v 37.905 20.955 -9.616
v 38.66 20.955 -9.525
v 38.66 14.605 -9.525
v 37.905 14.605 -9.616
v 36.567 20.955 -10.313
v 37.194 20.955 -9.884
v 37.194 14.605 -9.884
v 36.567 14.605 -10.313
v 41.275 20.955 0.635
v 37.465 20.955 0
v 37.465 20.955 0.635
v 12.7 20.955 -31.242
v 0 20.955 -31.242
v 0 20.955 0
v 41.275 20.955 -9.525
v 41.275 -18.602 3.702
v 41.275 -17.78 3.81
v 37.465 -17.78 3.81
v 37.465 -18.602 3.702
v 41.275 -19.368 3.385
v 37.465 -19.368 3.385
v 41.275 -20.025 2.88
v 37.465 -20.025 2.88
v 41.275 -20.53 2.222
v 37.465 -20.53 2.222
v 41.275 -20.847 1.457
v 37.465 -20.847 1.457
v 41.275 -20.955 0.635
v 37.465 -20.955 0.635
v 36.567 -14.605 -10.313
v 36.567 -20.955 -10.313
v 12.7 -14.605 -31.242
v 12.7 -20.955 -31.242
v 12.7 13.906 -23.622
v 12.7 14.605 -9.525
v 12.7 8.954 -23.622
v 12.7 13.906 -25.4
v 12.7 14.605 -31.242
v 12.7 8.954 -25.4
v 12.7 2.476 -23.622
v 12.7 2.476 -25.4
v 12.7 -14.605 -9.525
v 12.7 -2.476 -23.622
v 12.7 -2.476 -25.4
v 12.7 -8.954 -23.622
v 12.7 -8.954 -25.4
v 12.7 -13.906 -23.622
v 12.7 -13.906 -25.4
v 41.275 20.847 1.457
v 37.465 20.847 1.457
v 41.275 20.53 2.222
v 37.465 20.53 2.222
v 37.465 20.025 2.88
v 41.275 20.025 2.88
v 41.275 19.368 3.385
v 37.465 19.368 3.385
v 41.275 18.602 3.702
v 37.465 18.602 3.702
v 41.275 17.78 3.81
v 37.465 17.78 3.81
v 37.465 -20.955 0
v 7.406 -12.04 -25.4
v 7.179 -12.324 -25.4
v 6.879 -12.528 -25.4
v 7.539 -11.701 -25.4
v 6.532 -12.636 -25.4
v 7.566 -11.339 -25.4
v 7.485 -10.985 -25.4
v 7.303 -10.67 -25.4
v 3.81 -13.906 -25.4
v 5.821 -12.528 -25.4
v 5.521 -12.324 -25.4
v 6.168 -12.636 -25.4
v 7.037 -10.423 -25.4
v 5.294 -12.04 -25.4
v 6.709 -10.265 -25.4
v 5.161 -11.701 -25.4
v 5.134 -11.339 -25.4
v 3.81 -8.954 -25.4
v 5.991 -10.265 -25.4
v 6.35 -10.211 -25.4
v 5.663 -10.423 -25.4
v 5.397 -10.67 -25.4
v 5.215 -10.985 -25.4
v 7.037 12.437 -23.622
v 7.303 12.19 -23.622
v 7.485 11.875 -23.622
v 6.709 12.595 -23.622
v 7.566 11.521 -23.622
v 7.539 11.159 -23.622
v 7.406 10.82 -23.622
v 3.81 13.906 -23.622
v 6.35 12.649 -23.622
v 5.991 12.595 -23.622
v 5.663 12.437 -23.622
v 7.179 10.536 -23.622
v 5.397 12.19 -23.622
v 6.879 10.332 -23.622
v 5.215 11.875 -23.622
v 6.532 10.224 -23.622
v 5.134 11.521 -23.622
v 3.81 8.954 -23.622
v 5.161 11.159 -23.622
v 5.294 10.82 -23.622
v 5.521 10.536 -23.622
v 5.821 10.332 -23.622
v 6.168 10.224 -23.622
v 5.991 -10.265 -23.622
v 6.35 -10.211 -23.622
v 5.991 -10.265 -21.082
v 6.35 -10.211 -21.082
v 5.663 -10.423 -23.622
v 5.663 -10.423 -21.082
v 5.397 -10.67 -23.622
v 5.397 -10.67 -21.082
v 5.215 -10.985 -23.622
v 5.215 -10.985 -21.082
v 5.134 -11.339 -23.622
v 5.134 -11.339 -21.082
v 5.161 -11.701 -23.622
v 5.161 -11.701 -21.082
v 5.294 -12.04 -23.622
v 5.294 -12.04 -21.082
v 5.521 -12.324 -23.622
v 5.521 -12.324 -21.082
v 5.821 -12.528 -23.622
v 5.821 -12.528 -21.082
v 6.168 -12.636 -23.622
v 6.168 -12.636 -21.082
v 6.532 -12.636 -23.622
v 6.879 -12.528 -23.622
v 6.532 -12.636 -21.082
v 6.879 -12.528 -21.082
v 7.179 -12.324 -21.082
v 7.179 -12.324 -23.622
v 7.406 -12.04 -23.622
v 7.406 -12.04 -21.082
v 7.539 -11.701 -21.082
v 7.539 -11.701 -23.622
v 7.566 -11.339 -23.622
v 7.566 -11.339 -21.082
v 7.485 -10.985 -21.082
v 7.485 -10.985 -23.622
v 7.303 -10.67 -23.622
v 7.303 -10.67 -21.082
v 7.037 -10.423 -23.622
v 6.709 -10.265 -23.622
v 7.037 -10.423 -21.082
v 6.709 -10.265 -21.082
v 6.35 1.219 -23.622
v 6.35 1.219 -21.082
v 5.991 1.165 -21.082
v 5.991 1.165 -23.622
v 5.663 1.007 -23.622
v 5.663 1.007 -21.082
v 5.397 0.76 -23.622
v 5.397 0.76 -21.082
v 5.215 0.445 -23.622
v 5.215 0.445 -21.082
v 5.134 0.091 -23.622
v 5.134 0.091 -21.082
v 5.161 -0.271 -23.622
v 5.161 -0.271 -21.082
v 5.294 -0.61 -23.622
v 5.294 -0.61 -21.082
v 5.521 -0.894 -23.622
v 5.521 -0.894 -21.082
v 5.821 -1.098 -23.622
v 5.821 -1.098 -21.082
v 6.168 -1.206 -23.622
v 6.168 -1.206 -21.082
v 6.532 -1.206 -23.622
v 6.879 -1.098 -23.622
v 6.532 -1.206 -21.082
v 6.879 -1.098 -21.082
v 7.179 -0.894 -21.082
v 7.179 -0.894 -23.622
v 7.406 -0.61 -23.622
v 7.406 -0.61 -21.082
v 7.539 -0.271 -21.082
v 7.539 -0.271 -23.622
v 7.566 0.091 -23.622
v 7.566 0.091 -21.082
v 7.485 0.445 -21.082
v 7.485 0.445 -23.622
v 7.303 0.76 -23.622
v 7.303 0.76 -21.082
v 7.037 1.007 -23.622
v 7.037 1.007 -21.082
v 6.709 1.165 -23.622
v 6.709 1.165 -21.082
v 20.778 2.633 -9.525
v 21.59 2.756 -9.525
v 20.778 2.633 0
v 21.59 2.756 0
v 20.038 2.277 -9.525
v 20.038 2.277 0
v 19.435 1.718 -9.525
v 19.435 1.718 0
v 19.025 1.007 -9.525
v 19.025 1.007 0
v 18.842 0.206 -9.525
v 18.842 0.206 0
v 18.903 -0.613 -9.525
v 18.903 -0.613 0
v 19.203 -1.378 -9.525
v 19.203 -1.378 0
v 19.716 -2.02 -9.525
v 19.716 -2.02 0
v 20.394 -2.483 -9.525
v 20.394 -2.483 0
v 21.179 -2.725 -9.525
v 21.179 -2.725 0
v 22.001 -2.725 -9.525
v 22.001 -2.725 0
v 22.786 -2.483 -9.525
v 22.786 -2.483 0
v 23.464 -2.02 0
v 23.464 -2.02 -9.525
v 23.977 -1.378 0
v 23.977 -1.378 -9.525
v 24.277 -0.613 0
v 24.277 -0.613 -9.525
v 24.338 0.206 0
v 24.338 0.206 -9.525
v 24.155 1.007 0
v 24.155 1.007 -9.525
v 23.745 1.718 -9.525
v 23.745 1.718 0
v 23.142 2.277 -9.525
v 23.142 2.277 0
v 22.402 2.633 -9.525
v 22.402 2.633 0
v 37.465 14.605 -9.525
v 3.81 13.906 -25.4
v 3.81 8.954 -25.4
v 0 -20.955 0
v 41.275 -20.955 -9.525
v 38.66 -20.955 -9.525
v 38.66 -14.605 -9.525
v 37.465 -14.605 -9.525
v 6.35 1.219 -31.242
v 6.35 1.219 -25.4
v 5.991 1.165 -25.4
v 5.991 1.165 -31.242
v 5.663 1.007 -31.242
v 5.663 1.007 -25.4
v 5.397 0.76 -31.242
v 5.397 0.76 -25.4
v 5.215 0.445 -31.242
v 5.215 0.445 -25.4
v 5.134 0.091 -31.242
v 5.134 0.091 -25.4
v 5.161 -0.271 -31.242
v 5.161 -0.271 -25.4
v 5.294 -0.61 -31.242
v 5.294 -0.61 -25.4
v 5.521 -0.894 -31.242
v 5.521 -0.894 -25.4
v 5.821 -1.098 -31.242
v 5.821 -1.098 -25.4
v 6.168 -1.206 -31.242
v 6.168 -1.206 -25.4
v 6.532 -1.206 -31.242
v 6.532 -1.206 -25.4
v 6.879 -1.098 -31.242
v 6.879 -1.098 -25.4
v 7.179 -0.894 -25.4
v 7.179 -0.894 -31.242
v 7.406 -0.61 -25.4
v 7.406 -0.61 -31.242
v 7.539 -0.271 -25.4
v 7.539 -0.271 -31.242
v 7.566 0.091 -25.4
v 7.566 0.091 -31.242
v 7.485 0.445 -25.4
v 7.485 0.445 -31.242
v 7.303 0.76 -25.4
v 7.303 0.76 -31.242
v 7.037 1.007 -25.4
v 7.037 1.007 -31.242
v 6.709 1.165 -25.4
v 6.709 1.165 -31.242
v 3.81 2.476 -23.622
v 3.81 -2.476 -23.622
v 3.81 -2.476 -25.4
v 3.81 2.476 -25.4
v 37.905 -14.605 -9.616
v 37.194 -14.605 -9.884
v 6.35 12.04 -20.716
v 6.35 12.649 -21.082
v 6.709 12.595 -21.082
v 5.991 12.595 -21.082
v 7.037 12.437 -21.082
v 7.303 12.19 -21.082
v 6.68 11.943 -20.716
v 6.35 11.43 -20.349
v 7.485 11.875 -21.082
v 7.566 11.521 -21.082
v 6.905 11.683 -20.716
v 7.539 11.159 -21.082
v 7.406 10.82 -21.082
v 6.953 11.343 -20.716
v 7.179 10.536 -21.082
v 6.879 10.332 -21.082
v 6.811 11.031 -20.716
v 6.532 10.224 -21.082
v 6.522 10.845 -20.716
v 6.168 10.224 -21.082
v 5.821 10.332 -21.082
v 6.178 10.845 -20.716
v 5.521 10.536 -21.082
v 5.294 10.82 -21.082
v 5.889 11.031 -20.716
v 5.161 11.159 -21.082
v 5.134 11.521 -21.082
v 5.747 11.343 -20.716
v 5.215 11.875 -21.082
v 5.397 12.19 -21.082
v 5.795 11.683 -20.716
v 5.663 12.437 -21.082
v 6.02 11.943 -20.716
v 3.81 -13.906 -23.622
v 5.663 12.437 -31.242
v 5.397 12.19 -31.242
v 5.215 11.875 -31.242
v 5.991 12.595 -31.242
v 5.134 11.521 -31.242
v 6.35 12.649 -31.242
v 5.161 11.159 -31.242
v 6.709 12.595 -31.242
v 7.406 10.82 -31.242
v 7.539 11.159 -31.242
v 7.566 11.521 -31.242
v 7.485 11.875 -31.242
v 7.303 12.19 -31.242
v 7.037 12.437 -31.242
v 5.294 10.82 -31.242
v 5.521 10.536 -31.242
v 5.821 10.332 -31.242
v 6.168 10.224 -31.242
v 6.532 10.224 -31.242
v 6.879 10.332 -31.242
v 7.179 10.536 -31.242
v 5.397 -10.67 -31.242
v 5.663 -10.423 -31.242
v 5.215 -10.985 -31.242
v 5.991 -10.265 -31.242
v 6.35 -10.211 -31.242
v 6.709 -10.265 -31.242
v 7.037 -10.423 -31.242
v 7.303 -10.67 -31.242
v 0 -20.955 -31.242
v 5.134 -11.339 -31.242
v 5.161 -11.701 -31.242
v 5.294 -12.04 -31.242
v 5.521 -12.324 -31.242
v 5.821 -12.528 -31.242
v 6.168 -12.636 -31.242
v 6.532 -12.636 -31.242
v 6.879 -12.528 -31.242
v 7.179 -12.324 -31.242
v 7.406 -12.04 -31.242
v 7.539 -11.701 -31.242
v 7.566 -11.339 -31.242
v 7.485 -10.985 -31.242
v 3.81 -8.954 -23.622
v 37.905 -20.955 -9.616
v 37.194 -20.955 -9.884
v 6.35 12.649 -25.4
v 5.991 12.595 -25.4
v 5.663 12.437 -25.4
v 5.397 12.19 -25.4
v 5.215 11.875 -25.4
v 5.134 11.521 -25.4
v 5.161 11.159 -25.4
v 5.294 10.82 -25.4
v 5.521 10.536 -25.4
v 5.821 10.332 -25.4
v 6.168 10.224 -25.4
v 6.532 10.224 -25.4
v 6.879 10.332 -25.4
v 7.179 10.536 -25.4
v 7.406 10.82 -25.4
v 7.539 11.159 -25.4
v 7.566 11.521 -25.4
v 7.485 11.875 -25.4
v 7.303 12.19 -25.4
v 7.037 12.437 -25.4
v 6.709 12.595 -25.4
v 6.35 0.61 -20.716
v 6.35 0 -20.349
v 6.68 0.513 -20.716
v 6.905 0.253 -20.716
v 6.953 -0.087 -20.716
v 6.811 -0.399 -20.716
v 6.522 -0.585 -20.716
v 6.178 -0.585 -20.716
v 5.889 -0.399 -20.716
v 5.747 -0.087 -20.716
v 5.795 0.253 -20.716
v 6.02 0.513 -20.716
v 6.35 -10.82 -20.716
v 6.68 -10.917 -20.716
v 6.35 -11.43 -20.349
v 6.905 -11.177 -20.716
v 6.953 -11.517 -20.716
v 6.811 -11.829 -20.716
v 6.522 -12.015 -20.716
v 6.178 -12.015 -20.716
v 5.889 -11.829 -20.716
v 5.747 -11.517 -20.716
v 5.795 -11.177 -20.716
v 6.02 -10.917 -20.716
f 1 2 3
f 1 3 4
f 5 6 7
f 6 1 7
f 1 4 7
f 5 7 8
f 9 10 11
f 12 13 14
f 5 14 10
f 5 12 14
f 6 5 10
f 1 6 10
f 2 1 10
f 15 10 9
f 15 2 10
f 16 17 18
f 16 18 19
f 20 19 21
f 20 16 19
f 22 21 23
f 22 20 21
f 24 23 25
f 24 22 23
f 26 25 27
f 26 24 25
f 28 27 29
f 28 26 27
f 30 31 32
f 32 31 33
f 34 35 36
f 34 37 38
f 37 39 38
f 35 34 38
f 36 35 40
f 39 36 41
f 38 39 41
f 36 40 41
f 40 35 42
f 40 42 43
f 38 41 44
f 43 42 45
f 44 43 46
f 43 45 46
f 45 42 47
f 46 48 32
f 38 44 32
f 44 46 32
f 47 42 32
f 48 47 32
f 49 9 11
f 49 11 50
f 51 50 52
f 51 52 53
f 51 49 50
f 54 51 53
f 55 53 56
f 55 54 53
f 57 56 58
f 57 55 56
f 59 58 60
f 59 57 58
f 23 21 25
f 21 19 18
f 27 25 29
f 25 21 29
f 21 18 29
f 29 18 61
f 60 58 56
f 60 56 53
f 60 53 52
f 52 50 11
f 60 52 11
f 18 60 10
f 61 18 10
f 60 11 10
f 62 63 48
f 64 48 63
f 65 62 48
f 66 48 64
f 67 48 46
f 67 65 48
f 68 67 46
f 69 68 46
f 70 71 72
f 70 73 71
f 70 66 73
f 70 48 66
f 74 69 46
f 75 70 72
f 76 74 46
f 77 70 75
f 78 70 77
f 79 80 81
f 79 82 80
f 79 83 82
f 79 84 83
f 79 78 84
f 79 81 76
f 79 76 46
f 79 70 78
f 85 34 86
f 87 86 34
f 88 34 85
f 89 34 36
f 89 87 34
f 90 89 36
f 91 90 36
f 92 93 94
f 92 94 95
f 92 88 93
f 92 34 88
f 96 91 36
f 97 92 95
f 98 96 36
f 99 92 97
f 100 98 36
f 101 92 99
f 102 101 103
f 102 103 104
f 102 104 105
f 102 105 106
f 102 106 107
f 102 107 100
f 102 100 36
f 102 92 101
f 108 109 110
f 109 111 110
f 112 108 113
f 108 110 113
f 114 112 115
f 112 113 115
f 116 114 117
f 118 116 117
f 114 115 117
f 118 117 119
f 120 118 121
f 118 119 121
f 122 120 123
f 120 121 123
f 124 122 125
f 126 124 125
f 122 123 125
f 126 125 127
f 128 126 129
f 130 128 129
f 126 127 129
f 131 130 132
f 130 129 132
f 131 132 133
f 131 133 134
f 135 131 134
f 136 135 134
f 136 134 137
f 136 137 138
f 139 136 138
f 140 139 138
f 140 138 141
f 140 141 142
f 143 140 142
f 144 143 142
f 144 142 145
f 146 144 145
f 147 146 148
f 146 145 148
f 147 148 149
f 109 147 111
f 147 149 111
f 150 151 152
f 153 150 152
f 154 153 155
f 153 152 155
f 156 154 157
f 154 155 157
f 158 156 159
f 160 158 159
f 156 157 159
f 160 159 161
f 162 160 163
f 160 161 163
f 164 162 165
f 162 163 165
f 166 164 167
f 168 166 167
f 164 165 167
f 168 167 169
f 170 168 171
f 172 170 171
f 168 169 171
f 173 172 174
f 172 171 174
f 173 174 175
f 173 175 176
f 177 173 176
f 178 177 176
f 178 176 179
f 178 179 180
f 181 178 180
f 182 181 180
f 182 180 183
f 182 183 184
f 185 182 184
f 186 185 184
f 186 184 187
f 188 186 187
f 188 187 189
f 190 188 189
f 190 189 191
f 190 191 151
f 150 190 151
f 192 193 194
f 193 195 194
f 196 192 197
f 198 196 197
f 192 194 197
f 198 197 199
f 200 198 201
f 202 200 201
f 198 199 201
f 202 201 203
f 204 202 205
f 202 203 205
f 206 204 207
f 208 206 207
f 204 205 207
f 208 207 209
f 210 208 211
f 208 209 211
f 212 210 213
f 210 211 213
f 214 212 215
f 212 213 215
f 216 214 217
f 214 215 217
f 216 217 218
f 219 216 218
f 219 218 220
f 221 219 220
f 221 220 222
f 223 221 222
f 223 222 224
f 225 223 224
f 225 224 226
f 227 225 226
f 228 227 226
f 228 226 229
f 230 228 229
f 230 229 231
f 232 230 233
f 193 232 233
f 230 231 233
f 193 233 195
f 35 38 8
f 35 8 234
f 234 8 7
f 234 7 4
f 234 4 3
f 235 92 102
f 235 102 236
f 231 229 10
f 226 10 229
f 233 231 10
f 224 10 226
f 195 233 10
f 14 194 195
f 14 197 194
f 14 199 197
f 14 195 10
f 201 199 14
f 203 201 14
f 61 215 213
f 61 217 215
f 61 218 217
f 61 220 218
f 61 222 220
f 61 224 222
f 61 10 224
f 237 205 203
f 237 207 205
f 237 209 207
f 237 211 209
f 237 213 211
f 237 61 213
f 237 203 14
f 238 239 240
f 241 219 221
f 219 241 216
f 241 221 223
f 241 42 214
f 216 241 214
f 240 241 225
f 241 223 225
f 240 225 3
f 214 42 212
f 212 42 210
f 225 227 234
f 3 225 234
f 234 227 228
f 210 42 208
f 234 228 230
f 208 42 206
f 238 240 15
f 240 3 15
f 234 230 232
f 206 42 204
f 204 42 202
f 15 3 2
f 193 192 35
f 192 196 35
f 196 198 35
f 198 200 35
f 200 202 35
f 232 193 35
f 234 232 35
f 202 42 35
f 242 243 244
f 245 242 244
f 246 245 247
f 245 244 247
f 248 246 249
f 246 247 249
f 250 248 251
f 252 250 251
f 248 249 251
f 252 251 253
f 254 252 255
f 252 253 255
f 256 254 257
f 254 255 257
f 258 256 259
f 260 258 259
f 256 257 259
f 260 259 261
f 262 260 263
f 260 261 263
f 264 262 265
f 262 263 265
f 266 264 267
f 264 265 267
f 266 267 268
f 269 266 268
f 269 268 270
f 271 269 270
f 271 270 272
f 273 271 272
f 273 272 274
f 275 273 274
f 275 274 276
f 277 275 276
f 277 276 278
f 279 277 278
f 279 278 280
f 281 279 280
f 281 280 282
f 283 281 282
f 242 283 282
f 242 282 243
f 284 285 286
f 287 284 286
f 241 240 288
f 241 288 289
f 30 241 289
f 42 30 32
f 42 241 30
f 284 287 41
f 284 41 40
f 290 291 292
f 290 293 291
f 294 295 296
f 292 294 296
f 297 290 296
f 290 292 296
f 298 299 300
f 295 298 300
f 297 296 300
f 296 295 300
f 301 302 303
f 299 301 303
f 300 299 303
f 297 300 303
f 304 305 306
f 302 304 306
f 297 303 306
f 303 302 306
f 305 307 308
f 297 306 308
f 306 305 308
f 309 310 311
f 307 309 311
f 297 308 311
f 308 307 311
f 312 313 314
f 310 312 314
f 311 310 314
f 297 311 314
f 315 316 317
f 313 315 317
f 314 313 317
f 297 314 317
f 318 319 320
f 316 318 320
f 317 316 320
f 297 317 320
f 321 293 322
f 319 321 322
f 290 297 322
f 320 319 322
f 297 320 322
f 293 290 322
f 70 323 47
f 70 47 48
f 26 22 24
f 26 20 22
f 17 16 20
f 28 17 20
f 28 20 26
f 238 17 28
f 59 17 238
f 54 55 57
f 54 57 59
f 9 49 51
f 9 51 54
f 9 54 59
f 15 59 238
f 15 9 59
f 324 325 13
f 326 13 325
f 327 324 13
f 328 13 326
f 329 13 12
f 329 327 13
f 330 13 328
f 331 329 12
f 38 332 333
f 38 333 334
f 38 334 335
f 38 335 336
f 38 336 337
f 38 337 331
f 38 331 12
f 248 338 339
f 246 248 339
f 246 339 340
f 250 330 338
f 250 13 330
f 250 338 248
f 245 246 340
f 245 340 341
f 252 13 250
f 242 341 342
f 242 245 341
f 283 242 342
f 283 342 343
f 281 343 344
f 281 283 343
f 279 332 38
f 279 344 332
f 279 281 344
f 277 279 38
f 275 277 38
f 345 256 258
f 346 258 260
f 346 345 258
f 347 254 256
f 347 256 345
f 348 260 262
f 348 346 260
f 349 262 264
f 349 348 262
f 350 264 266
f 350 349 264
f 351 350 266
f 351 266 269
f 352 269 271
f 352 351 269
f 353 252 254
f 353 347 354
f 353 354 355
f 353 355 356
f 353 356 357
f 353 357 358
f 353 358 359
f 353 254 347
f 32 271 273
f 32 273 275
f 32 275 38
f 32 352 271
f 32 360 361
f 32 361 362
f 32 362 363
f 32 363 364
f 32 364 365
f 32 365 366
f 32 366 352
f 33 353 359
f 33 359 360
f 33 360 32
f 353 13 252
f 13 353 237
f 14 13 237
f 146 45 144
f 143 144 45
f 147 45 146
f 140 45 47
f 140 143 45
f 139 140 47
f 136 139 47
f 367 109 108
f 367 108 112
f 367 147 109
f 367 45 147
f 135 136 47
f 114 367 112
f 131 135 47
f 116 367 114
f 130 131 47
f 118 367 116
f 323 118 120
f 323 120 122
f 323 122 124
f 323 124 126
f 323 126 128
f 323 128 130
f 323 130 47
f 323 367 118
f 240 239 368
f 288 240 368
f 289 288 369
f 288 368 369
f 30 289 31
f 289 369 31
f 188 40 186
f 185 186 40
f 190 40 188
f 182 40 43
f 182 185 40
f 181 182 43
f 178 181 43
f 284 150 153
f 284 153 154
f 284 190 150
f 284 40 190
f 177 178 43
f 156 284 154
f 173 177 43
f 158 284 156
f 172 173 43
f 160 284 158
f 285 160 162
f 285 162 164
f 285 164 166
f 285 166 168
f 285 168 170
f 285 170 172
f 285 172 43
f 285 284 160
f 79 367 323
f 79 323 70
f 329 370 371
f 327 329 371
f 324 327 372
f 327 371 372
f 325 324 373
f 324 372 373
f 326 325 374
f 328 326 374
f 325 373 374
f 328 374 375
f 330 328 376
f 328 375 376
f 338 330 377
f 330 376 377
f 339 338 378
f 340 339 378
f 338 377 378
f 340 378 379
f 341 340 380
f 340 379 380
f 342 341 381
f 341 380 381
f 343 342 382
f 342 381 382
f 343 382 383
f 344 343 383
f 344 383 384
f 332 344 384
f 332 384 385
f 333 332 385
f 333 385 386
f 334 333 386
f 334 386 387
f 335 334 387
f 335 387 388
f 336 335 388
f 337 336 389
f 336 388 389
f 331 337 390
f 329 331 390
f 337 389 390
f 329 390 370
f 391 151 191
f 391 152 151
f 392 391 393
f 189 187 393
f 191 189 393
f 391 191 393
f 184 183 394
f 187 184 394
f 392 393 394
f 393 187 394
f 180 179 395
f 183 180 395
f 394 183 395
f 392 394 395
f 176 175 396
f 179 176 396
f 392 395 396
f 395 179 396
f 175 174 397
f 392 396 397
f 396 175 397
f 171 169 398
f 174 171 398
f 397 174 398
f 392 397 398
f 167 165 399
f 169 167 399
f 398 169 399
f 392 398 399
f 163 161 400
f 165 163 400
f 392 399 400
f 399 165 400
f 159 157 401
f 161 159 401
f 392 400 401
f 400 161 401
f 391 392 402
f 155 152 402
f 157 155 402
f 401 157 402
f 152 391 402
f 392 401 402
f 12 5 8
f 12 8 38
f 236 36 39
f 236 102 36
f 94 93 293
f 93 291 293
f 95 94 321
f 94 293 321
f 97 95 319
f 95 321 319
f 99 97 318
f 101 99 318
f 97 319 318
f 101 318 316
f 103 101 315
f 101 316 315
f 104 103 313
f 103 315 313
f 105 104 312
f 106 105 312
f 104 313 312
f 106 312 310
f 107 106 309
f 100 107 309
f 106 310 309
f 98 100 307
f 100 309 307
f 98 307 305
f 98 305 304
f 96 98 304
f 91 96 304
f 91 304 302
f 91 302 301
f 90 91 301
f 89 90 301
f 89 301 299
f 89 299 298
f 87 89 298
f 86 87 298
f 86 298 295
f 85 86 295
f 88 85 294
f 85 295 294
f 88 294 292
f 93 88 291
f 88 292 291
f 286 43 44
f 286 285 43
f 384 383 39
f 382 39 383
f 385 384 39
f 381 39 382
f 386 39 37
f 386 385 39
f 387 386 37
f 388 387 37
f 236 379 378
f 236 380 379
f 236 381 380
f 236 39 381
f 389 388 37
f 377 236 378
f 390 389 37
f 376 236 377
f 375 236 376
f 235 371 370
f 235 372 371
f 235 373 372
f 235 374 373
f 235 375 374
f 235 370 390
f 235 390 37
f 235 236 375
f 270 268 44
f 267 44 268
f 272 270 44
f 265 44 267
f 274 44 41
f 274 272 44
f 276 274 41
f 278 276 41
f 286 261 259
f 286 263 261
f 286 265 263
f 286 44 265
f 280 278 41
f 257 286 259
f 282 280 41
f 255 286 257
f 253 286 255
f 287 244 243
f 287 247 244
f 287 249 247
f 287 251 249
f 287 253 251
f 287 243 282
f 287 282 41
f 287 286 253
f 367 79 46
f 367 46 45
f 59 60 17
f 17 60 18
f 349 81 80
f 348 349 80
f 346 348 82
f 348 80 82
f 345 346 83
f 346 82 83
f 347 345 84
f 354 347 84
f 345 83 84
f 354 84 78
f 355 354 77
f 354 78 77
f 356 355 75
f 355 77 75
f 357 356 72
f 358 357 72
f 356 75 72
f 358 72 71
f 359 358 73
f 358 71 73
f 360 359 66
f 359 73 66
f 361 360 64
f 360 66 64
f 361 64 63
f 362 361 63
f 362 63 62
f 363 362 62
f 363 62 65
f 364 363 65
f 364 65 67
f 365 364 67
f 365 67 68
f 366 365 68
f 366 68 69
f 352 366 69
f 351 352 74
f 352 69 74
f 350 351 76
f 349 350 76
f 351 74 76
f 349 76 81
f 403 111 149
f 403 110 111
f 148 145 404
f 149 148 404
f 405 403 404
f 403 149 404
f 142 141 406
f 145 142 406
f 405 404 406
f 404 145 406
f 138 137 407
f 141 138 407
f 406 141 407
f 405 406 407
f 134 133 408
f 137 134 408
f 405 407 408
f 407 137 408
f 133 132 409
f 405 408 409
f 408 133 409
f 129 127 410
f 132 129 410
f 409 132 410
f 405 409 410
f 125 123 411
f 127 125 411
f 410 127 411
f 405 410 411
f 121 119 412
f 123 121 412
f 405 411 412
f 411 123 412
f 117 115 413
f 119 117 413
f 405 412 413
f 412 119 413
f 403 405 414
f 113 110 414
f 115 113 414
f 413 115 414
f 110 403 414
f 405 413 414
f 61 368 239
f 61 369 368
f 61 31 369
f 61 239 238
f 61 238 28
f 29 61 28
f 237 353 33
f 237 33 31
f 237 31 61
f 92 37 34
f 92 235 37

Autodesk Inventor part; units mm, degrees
ref_plane "YZ Plane" through (0, 0, 0) normal (1, 0, 0) x (0, 1, 0)
ref_plane "XZ Plane" through (0, 0, 0) normal (0, 1, 0) x (-1, 0, 0)
ref_plane "XY Plane" through (0, 0, 0) normal (0, 0, 1) x (1, 0, 0)
sketch "Sketch1" plane through (0, 0, 0) normal (0, 1, 0) x (-1, 0, 0)
  line L0 (0, -37.4904) -> (0, 6.2484) projected
  line L1 (-44.958, 0) -> (7.493, 0) projected
  line L2 (0, 0) -> (-37.465, 0)
  line L3 (-37.465, 0) -> (-37.465, -9.525)
  line L4 (-37.465, -9.525) -> (0, -9.525)
  line L5 (0, -9.525) -> (0, 0)
  line L6 (0, -9.525) -> (-12.7, -9.525)
  line L7 (-12.7, -9.525) -> (-12.7, -31.242)
  line L8 (0, -31.242) -> (0, -9.525)
  line L9 (0, -31.242) -> (-12.7, -31.242)
  dimension "d10" = 9.525
  dimension "d36" = 31.242
  dimension "d37" = 12.7
  dimension "d38" = 37.465
extrude "Extrusion3" add sketch "Sketch1" along normal mid plane 41.91
sketch "Sketch2" plane through (37.465, 20.955, -9.525) normal (0, 0, -1) x (-1, 0, 0)
  line L0 (24.765, -41.91) -> (24.765, 0) projected
  line L1 (0, 0) -> (24.765, 0) projected
  line L2 (0, -41.91) -> (0, 0) projected
  line L3 (24.765, -41.91) -> (0, -41.91) projected
  line L4 (-7.493, -20.955) -> (44.958, -20.955) projected
  line L5 (37.465, -41.91) -> (37.465, 0) projected
  point P0 (37.465, -20.955)
  point P1 (15.875, -20.955)
  dimension "d56" = 0
  dimension "d57" = 21.59
hole "Hole1" at (21.59, 0, -9.525) direction (0, 0, 1) diameter 5.5118 end through all clearance for "Socket Head Cap Screw" size "M5" standard "Ansi Metric M Profile"
sketch "Sketch3" plane through (0, -20.955, 0) normal (0, 1, 0) x (-1, 0, 0)
  line L0 (-12.7, -31.242) -> (-12.7, -9.525) projected
  line L1 (-12.7, -9.525) -> (-37.465, -9.525) projected
  line L2 (-37.465, -9.525) -> (-12.7, -31.242)
  line L3 (-12.7, -31.242) -> (-12.7, -9.525)
  line L4 (-37.465, -9.525) -> (-12.7, -9.525)
  point P0 (0, 0)
extrude "Extrusion4" add sketch "Sketch3" along normal blind 6.35
sketch "Sketch4" plane through (12.7, 20.955, -31.242) normal (0, 0, -1) x (-1, 0, 0)
  line L0 (12.7, -50.292) -> (12.7, 8.382) projected
  line L1 (-32.258, -20.955) -> (20.193, -20.955) projected
  line L2 (0, -35.56) -> (0, 0) projected
  point P0 (12.7, -20.955)
  point P1 (6.35, -9.525)
  point P2 (6.35, -32.385)
  point P3 (6.35, -20.955)
  dimension "d39" = 11.43
  dimension "d40" = 11.43
  dimension "d41" = 6.35
  dimension "d63" = 12.7
hole "Hole2" at (6.35, 11.43, -31.242) at (6.35, -11.43, -31.242) at (6.35, 0, -31.242) direction (0, 0, 1) diameter 2.4384 depth 10.16 tip angle 118 clearance for "Flat Head Machine Screw (100)" size "#2" standard "Ansi Unified Screw Threads"
sketch "Sketch5" plane through (12.7, 20.955, -9.525) normal (1, 0, 0) x (0, 0, -1)
  line L0 (-15.7734, -20.955) -> (27.9654, -20.955) projected
  line L1 (-9.525, -50.292) -> (-9.525, 8.382) projected
  line L2 (14.097, -12.0015) -> (15.875, -12.0015)
  line L3 (15.875, -12.0015) -> (15.875, -7.0485)
  line L4 (15.875, -7.0485) -> (14.097, -7.0485)
  line L5 (14.097, -7.0485) -> (14.097, -12.0015)
  line L6 (14.097, -12.0015) -> (15.875, -7.0485) construction
  line L7 (15.875, -12.0015) -> (14.097, -7.0485) construction
  line L8 (14.097, -23.4315) -> (15.875, -23.4315)
  line L9 (15.875, -23.4315) -> (15.875, -18.4785)
  line L10 (15.875, -18.4785) -> (14.097, -18.4785)
  line L11 (14.097, -18.4785) -> (14.097, -23.4315)
  line L12 (14.097, -23.4315) -> (15.875, -18.4785) construction
  line L13 (15.875, -23.4315) -> (14.097, -18.4785) construction
  line L14 (14.097, -34.8615) -> (15.875, -34.8615)
  line L15 (15.875, -34.8615) -> (15.875, -29.9085)
  line L16 (15.875, -29.9085) -> (14.097, -29.9085)
  line L17 (14.097, -29.9085) -> (14.097, -34.8615)
  line L18 (14.097, -34.8615) -> (15.875, -29.9085) construction
  line L19 (15.875, -34.8615) -> (14.097, -29.9085) construction
  line L20 (21.717, -35.56) -> (21.717, 0) projected
  point P0 (-9.525, -20.955)
  point P1 (14.986, -9.525)
  point P2 (14.986, -20.955)
  point P3 (14.986, -32.385)
  point P4 (14.986, -9.525)
  point P5 (14.986, -32.385)
  dimension "d49" = 4.953
  dimension "d50" = 1.778
  dimension "d51" = 11.43
  dimension "d58" = 7.62
  dimension "d59" = 11.43
extrude "Extrusion5" cut sketch "Sketch5" along normal blind 10.16 and the other way blind 8.89
sketch "Sketch6" plane through (0, 20.955, 0) normal (0, 1, 0) x (1, 0, 0)
  line L0 (12.7, 9.525) -> (12.7, 31.242) projected
  line L1 (37.465, 9.525) -> (12.7, 9.525) projected
  line L2 (37.465, 9.525) -> (12.7, 31.242) projected
  point P0 (0, 0)
extrude "Extrusion6" add sketch "Sketch6" against normal blind 6.35
sketch "Sketch7" plane through (0, 20.955, 0) normal (0, 1, 0) x (1, 0, 0)
  line L0 (0, 0) -> (37.465, 0) projected
  line L1 (37.465, 0) -> (37.465, 9.525) projected
  line L2 (25.7746, 0) -> (37.5697, -3.1605)
  line L3 (37.5697, -3.1605) -> (37.465, 0)
  line L4 (25.7746, 0) -> (37.465, 0)
  dimension "d64" = 11.684
  dimension "d65" = 15
extrude "Extrusion7" [suppressed]
sketch "Sketch8" plane through (37.465, -20.955, 0) normal (1, 0, 0) x (0, 0, -1)
  line L0 (9.525, 0) -> (9.525, 6.35) projected
  line L1 (9.525, 6.35) -> (9.525, 35.56) projected
  line L2 (9.525, 35.56) -> (9.525, 41.91) projected
  line L3 (0, 41.91) -> (9.525, 41.91) projected
  line L4 (0, 0) -> (0, 41.91) projected
  line L5 (9.525, 0) -> (0, 0) projected
  line L6 (9.525, 41.91) -> (-3.81, 41.91)
  line L7 (-3.81, 41.91) -> (-3.81, 0)
  line L8 (-3.81, 0) -> (9.525, 0)
  line L9 (9.525, 0) -> (9.525, 41.91)
  point P0 (0, 20.955)
  dimension "d68" = 0
  dimension "d69" = 3.81
extrude "Extrusion8" add sketch "Sketch8" along normal blind 3.81
fillet "Fillet2" radius 3.175 4 edges at (37.465, 17.78, -9.525) (37.465, -17.78, -9.525) (39.37, 20.955, 3.81) (39.37, -20.955, 3.81)
equation "\"d40\" = d39"
equation "\"d41\" = 0.5 * d63"
properties material "ABS, BLACK"
